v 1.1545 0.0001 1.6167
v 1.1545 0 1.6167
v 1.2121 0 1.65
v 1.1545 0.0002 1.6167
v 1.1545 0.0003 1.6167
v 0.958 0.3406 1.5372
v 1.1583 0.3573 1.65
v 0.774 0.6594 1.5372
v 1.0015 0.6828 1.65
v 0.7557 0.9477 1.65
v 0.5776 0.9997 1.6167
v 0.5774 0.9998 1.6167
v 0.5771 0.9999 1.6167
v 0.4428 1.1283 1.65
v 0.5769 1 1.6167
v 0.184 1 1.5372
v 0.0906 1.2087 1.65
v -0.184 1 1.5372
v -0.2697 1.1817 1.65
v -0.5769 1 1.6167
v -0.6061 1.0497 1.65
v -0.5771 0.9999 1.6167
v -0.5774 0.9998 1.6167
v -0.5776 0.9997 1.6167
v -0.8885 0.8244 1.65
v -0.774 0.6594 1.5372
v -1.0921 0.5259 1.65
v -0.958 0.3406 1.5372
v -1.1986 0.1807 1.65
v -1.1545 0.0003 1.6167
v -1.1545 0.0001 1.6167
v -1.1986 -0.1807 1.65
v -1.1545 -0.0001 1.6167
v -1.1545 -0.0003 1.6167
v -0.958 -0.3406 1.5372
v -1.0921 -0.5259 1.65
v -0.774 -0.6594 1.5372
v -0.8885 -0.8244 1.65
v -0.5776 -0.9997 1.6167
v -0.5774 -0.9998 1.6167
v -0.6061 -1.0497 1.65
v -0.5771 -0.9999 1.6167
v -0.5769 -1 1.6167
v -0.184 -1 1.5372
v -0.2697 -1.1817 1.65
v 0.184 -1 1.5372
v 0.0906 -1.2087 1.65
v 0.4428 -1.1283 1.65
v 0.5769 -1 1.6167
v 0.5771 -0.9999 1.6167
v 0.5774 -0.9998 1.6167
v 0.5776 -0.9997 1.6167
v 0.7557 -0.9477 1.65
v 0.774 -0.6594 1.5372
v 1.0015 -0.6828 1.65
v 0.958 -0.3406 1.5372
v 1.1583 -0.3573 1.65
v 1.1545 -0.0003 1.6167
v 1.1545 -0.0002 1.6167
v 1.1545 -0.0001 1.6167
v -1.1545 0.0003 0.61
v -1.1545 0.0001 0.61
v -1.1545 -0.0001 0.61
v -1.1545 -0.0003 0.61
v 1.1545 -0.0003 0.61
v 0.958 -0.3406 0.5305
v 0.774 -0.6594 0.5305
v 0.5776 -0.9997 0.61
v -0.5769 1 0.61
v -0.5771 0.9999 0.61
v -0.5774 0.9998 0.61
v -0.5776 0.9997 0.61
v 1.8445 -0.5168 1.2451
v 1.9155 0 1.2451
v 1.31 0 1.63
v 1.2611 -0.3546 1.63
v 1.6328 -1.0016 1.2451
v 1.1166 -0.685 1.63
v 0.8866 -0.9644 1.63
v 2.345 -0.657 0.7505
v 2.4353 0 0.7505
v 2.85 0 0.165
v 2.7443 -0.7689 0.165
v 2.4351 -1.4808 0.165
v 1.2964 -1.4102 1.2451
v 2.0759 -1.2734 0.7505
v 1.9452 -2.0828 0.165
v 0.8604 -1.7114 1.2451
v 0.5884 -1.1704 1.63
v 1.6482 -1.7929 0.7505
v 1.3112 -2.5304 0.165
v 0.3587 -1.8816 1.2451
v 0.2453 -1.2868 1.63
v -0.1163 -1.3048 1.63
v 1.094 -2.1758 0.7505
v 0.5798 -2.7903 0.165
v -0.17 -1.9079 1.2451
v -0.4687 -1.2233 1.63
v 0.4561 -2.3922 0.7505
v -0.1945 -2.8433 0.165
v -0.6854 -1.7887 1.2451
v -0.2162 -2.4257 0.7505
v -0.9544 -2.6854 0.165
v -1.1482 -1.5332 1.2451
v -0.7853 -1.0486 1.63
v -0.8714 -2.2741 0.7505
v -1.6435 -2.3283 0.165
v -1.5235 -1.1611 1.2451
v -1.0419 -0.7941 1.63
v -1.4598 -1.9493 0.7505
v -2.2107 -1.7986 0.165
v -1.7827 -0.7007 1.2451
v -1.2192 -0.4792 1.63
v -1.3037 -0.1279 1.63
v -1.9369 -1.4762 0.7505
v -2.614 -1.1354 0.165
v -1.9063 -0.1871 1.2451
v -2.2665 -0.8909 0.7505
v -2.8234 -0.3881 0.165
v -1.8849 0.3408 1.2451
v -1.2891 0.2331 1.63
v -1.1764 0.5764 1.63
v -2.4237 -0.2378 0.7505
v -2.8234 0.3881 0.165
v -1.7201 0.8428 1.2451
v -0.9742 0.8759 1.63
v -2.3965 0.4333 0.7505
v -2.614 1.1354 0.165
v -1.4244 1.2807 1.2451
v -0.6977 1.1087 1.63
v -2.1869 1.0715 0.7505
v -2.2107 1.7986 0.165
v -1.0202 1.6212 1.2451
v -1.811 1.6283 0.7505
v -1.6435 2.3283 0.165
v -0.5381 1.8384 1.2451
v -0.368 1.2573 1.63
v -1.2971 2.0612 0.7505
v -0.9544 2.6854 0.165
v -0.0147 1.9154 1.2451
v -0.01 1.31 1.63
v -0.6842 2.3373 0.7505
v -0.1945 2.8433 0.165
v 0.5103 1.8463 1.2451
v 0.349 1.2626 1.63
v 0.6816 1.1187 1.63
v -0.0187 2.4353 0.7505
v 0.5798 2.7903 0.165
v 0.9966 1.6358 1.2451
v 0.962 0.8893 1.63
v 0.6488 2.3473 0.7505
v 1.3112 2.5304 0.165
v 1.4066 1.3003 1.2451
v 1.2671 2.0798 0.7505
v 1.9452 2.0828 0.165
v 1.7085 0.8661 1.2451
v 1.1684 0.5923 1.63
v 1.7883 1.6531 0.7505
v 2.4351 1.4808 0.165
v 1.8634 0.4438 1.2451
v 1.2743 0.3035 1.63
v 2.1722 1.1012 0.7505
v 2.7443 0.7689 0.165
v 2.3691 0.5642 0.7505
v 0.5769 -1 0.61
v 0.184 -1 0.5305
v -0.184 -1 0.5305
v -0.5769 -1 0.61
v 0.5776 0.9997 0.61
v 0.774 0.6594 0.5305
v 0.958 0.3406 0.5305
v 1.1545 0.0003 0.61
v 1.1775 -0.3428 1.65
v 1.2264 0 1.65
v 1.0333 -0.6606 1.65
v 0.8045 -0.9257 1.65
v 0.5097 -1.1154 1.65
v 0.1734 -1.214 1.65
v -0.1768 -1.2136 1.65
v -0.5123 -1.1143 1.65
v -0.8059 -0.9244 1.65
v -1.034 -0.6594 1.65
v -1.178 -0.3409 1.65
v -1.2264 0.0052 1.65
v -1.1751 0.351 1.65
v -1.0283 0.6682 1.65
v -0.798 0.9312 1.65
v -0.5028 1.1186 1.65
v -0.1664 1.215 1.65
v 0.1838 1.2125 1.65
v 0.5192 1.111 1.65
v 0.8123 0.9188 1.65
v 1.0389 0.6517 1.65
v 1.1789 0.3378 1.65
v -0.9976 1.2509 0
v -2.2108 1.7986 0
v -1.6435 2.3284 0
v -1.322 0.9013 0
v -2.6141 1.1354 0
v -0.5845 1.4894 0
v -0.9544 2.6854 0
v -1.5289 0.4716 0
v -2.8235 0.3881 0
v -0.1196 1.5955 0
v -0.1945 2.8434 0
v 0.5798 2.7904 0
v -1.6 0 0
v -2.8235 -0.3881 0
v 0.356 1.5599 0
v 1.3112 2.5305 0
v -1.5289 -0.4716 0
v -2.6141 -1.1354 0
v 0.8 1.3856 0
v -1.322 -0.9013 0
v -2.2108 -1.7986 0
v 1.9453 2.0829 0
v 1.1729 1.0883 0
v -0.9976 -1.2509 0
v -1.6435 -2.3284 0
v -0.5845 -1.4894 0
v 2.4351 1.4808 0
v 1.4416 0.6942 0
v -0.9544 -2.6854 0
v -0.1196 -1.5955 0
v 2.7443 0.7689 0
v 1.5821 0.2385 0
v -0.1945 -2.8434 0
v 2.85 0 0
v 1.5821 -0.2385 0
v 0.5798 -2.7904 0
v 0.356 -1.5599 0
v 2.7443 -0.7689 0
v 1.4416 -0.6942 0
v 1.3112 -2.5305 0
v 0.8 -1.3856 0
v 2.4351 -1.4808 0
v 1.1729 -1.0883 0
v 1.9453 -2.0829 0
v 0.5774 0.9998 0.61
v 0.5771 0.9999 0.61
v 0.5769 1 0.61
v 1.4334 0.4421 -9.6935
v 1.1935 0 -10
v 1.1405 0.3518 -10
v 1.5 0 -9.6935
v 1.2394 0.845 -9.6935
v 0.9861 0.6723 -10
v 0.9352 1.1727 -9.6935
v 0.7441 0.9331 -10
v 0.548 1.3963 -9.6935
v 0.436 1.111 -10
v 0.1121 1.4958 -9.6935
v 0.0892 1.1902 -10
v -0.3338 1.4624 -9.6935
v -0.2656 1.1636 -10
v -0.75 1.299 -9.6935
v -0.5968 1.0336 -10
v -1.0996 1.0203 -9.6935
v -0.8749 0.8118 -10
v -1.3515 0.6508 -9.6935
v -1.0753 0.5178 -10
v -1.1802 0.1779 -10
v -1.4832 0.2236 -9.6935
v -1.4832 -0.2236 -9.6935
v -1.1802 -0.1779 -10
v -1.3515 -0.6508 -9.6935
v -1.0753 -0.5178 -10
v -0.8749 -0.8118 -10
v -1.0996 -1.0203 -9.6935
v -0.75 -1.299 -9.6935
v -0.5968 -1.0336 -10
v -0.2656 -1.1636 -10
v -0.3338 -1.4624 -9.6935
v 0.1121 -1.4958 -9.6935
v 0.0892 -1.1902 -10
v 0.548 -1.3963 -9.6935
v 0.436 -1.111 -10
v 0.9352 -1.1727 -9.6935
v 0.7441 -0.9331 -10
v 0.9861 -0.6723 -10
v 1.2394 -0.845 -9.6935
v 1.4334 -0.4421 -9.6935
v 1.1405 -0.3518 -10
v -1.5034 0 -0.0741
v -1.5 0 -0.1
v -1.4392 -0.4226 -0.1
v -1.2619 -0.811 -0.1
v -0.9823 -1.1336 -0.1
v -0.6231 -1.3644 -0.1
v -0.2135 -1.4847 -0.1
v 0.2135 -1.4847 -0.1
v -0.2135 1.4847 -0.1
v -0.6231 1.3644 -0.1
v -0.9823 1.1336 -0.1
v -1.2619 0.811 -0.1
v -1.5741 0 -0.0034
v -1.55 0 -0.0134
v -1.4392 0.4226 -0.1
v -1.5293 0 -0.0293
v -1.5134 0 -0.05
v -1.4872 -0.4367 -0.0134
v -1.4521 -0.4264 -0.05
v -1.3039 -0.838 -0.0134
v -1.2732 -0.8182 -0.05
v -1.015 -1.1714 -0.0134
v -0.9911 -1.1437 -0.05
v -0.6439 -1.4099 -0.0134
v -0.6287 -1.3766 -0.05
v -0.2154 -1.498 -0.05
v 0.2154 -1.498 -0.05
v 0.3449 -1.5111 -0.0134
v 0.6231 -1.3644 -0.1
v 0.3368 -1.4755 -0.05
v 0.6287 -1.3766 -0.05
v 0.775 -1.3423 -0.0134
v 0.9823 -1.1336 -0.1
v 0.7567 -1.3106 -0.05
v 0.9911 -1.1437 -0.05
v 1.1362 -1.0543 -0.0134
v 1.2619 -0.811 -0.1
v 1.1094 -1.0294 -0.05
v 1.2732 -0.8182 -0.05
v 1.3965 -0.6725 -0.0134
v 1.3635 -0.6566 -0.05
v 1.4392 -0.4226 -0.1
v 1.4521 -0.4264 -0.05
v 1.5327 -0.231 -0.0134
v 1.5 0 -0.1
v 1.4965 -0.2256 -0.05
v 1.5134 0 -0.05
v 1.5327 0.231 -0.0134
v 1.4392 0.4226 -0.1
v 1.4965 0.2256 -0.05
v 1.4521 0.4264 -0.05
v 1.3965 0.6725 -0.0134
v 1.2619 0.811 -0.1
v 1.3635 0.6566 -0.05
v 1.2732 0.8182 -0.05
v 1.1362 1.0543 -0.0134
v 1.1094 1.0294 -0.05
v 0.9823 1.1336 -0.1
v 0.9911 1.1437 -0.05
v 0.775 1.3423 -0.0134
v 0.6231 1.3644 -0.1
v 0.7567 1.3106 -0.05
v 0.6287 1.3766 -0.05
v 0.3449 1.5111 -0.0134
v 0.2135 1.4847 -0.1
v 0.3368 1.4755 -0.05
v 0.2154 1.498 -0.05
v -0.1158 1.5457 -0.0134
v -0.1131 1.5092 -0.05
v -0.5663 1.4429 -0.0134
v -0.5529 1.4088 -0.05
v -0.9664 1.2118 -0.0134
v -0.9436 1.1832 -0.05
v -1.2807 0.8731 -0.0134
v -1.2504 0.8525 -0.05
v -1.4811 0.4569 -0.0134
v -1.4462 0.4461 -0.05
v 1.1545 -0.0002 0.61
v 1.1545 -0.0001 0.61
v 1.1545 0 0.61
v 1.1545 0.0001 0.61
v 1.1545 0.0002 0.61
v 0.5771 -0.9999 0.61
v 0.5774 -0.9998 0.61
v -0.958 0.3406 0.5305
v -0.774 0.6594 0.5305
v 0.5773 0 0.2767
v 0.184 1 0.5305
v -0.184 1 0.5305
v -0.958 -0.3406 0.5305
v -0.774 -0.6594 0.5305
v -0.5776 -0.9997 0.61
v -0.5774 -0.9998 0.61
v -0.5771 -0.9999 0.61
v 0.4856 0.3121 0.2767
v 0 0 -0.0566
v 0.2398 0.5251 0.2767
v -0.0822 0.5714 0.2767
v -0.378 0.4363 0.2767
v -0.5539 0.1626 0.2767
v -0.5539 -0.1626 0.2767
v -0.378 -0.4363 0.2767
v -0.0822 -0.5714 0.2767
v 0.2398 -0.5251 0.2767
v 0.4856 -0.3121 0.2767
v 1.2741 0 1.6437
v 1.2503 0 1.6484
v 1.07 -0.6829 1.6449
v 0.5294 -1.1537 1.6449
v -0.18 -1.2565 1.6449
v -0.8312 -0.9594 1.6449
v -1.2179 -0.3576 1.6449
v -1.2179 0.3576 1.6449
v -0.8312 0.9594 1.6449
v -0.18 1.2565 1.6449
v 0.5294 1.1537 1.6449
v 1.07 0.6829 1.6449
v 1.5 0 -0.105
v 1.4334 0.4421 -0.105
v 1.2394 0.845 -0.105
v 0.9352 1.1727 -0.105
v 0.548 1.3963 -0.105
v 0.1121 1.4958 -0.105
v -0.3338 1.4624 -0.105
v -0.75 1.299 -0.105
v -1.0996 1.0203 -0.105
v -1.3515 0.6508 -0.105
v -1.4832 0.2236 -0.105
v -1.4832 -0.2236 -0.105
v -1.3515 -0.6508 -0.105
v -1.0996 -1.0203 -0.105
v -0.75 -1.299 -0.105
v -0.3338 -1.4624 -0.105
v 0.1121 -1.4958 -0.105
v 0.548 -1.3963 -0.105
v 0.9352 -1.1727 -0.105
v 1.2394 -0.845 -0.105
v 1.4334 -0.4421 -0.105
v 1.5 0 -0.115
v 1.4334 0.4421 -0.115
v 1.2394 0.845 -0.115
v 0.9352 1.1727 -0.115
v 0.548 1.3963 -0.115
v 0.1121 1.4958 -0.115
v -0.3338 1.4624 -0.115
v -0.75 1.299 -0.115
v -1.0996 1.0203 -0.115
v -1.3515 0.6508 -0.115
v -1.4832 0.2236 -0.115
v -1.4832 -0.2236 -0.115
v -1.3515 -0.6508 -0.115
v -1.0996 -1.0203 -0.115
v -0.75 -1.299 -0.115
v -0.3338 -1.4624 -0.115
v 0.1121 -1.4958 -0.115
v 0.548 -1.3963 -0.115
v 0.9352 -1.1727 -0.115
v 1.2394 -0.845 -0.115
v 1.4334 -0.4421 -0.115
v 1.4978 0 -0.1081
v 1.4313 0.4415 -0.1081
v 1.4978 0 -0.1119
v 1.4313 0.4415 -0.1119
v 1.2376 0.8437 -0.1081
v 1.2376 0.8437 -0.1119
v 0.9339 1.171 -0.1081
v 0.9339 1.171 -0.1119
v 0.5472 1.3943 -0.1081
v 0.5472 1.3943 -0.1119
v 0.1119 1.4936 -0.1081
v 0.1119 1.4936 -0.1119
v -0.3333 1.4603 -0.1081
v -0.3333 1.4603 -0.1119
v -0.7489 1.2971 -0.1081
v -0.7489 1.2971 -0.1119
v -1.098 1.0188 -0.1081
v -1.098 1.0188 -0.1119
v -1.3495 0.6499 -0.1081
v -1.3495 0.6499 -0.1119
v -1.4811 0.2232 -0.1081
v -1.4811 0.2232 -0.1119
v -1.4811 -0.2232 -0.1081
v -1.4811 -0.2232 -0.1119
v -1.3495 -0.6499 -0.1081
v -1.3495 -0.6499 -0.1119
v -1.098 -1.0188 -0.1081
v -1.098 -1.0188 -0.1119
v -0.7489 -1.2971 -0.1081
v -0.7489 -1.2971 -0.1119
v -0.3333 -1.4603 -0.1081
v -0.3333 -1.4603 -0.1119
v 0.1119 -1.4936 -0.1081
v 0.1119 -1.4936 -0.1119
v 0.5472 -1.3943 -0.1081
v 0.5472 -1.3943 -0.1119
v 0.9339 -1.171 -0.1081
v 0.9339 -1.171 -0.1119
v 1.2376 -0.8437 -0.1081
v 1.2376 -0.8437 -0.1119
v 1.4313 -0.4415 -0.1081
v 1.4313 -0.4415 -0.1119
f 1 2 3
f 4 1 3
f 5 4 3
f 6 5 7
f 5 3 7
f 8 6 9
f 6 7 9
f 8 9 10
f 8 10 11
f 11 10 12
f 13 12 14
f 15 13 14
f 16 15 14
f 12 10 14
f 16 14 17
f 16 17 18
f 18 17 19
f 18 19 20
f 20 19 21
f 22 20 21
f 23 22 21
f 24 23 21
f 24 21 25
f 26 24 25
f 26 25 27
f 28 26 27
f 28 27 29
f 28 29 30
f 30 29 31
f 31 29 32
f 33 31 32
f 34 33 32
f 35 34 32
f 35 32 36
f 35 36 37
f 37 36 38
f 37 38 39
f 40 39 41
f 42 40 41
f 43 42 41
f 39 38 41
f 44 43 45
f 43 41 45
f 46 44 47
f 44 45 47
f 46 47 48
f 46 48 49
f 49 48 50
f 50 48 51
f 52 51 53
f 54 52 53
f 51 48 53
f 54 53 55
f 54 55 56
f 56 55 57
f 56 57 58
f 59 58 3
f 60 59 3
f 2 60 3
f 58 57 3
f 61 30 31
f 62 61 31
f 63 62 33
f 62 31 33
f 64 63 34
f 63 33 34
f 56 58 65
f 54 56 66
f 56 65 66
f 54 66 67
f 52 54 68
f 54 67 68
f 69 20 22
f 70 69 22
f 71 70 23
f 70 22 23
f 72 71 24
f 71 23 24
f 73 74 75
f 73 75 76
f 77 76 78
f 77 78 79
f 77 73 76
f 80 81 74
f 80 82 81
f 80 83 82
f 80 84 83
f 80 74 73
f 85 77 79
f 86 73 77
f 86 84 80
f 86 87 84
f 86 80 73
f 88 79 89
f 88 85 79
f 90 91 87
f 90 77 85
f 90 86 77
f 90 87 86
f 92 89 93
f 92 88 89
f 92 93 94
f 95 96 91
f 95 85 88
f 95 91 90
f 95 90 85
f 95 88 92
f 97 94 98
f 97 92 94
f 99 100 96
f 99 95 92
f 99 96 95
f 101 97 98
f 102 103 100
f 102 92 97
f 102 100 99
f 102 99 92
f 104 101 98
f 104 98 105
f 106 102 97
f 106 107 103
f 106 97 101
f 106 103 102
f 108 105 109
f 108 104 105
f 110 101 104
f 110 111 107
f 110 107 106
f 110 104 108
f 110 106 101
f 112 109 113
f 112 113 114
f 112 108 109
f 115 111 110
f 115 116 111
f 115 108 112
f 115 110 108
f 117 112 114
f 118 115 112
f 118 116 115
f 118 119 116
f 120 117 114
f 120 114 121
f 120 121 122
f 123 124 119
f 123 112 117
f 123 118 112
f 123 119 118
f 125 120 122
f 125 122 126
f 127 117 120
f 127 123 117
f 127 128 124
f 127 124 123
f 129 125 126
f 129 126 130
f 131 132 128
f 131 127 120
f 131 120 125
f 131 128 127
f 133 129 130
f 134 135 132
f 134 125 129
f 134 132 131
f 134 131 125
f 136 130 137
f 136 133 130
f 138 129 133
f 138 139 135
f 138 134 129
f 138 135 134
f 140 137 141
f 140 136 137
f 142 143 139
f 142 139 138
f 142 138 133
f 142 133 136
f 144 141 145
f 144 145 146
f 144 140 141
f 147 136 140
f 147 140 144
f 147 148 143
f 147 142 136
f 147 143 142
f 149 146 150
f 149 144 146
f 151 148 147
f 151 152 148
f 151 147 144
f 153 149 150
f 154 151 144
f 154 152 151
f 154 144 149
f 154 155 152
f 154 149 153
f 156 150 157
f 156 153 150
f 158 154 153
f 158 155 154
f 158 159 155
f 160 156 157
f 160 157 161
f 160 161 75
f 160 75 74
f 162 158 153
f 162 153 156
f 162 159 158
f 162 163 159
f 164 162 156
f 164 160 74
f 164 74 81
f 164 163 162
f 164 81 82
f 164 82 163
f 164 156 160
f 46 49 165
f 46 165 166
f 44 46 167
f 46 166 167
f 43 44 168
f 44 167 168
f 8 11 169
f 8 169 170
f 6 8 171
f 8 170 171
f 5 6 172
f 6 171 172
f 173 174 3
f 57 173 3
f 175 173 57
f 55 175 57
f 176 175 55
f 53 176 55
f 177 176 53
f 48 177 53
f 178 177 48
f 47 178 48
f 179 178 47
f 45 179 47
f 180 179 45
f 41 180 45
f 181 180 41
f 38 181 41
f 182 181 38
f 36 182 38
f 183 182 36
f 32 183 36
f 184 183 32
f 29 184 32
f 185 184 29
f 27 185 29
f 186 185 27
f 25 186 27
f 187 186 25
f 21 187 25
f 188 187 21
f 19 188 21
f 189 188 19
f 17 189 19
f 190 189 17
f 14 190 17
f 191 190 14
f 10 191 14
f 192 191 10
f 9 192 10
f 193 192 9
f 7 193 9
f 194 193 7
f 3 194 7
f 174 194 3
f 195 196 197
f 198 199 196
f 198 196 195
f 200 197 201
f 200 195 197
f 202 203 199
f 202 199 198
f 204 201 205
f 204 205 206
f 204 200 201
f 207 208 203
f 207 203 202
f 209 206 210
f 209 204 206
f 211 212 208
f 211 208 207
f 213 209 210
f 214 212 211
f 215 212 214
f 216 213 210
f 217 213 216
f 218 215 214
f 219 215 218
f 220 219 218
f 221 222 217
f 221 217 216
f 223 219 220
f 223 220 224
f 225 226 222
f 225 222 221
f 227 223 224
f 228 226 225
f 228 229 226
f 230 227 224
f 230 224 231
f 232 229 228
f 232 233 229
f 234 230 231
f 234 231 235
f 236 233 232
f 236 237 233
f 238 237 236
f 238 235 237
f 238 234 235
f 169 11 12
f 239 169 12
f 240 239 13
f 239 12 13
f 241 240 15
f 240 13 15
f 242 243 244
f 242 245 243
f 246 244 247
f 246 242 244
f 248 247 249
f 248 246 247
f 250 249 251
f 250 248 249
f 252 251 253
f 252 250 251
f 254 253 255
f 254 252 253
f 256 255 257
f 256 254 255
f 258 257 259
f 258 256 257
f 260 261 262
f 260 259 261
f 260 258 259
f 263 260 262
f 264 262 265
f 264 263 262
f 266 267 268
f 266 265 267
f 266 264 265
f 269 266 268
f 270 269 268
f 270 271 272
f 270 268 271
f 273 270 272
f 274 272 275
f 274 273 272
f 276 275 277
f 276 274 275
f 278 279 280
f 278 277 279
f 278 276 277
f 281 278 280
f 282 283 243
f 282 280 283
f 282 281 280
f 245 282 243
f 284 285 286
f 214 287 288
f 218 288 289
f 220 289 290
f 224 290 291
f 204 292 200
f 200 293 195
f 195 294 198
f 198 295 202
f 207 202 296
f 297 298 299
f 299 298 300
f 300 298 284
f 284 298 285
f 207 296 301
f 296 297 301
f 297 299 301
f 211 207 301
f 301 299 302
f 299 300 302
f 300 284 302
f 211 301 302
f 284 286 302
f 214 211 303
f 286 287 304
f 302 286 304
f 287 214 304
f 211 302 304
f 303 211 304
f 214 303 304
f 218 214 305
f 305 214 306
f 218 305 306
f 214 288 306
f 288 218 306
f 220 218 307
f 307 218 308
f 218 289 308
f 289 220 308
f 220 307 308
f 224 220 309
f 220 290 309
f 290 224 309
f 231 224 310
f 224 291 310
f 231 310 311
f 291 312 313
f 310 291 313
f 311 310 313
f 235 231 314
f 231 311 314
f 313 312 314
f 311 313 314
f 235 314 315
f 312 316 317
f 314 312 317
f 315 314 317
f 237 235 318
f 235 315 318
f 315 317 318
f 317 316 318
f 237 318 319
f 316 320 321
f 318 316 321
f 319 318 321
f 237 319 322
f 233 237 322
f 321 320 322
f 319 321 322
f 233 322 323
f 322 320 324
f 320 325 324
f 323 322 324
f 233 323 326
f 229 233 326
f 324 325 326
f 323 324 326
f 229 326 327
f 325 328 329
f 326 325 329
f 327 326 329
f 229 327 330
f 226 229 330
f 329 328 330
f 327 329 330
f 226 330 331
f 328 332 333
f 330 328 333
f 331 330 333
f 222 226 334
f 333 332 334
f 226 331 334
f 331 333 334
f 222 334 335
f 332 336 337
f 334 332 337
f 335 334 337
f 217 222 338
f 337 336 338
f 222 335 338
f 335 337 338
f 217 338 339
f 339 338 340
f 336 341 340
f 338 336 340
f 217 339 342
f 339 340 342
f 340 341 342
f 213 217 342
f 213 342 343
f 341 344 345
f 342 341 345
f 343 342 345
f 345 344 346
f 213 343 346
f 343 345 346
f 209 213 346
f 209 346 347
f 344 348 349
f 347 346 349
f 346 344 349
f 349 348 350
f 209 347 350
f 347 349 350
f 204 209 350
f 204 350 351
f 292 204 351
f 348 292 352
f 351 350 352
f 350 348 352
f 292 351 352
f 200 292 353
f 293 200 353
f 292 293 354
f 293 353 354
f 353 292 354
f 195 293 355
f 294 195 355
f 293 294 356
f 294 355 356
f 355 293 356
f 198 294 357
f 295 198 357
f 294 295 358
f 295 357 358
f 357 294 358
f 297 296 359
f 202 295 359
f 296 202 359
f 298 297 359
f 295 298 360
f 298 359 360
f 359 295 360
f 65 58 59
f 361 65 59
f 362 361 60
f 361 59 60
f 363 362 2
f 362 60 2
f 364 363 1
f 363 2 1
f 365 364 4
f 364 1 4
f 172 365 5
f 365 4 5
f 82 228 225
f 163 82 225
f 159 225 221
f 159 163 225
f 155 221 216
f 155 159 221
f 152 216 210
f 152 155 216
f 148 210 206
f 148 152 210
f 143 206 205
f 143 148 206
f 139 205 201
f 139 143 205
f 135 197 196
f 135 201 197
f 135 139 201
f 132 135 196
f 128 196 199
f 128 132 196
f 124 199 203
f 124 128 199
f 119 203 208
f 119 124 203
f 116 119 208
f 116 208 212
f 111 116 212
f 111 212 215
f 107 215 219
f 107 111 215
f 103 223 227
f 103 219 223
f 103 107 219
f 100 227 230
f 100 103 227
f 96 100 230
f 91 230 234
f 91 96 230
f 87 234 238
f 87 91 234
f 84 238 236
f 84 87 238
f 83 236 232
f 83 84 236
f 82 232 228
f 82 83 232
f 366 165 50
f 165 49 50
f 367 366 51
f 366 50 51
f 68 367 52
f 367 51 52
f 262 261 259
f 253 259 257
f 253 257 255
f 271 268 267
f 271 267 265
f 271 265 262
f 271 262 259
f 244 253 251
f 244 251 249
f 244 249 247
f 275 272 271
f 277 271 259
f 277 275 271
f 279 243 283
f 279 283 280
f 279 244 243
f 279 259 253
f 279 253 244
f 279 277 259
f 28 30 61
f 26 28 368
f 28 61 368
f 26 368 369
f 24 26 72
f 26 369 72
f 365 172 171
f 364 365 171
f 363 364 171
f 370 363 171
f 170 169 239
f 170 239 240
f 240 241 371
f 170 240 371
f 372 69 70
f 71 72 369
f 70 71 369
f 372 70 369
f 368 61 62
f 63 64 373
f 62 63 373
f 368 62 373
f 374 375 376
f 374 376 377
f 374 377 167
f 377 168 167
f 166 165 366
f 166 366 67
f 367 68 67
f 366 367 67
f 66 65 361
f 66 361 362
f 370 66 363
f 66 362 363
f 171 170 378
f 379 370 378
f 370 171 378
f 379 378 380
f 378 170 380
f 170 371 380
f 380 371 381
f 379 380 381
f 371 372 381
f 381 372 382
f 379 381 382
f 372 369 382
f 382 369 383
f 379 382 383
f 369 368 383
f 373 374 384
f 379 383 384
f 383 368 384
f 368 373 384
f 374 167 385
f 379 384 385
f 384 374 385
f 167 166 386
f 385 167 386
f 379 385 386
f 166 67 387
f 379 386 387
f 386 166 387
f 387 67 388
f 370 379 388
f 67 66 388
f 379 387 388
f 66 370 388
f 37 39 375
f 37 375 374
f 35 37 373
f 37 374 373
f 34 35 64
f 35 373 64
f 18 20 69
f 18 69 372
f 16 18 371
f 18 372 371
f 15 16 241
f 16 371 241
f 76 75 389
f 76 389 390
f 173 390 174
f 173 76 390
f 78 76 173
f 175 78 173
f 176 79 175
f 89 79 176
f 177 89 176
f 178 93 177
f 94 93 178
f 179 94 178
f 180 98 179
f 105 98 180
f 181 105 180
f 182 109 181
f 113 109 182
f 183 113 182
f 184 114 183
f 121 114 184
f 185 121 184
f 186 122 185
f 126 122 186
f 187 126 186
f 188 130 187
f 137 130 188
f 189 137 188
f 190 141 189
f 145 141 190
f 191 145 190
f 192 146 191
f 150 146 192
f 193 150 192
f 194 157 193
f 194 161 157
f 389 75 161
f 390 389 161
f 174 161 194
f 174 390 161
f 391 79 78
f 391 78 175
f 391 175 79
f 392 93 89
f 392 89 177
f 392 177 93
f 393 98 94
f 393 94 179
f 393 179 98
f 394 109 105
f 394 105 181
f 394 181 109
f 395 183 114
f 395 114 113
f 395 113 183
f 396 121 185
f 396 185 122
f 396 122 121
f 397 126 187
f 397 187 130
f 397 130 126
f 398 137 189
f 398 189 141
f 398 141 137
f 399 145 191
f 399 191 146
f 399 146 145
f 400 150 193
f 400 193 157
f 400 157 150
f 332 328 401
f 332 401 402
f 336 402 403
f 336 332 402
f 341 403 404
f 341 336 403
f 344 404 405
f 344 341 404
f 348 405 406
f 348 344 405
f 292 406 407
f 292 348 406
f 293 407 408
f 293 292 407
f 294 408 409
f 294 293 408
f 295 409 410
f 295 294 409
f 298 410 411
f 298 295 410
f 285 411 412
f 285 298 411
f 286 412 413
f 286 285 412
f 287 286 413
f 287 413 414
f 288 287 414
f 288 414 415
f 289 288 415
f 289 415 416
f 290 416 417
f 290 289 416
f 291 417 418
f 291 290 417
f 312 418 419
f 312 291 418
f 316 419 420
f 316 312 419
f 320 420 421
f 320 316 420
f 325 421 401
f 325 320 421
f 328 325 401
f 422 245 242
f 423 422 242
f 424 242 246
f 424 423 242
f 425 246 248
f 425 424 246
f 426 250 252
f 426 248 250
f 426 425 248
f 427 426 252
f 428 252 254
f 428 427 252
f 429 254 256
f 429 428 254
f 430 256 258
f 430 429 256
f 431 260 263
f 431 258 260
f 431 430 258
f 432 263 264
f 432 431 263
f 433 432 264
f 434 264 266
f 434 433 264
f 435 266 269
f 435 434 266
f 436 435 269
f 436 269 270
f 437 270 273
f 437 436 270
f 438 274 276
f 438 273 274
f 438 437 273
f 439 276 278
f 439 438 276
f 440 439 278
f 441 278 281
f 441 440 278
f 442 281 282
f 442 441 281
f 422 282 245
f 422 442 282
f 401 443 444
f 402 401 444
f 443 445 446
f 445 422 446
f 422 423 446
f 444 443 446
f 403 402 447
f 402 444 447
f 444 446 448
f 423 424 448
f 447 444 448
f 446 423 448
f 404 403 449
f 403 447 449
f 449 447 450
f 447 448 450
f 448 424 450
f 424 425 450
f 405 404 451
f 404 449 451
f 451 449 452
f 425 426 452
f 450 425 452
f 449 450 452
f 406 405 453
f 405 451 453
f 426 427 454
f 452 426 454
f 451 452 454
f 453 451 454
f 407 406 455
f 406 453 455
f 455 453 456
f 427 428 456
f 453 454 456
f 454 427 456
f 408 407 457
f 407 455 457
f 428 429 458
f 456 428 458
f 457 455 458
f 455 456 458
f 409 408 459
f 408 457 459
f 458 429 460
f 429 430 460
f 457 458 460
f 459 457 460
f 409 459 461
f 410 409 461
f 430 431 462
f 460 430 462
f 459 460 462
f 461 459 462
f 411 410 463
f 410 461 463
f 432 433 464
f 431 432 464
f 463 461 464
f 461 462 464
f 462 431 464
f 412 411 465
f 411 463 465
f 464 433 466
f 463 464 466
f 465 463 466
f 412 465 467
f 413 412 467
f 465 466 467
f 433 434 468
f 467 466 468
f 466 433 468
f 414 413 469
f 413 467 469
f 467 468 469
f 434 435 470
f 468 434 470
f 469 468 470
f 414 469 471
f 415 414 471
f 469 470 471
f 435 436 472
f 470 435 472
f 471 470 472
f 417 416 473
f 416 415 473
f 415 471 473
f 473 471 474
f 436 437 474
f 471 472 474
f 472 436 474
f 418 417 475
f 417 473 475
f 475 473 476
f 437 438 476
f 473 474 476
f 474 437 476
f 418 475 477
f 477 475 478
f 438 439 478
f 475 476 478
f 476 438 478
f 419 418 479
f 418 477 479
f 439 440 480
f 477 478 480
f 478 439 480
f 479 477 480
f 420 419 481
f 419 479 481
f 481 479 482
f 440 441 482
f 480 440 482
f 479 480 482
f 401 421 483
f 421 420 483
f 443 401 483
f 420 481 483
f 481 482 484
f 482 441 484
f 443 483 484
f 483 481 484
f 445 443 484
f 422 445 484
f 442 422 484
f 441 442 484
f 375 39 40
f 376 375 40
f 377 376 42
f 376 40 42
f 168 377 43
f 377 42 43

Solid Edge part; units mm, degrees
sketch "Sketch1" plane through (0, 0, 0) normal (0, -1, 0) x (1, 0, 0)
  line L0 (0, -10) -> (1.5, -10)
  line L1 (1.5, -10) -> (1.5, -0.115)
  arc A0 (1.5, -0.105) -> (1.5, -0.115) centre (1.5038, -0.11) ccw
  line L2 (1.5, -0.105) -> (1.5, 0)
  line L3 (1.5, 0) -> (2.85, 0)
  line L4 (2.85, 0) -> (2.85, 0.165)
  arc A1 (1.27, 1.65) -> (2.85, 0.165) centre (-0.3628, -1.6703) cw
  line L5 (0, 1.65) -> (1.27, 1.65)
  dimension "D1" = 9.885
  dimension "D2" = 1.5
  dimension "D3" = 1.27
  dimension "D4" = 2.85
  dimension "D5" = 0.165
  dimension "D6" = 1.65
  dimension "D7" = 3.7
  dimension "D8" = 10
  dimension "D9" = 0.01
  dimension "D10" = 0.0025
revolve "RevolvedProtrusion1" add sketch "Sketch1" angle 360 about axis through (0, 0, 5) along (0, 0, -1)
sketch "Sketch2" plane through (0, 0, 0) normal (0, -1, 0) x (1, 0, 0)
  line L0 (0, -0.0566) -> (1.1545, 0.61)
  line L1 (1.1545, 0.61) -> (1.1545, 1.65)
  line L2 (1.1545, 1.65) -> (0, 1.65)
  dimension "D1" = 1.1545
  dimension "D2" = 1.04
revolve "RevolvedCutout1" cut sketch "Sketch2" angle 360 about axis through (0, 0, 5.3) along (0, 0, -1)
sketch "Sketch3" plane through (0, 0, 0) normal (0, 0, -1) x (0, 1, 0)
  arc A0 (-1, 0.577) -> (-1, -0.577) centre (0, 0) ccw
  line L0 (-1, 0.577) -> (-1, -0.577)
  dimension "D1" = 1
extrude "Protrusion1" add sketch "Sketch3" against normal blind 1.65
pattern_circular "Pattern1" count 6 over 360 about axis through (0, 0, 0) along (0, 0, -1) of "Protrusion1"
fillet "Round_1" radius 0.185 1 edges at (-1.27, 0, 1.65)
sketch "Sketch4" plane through (0, 0, 0) normal (0, -1, 0) x (1, 0, 0)
  line L0 (0, 0.9501) -> (1.2122, 1.65)
  line L1 (1.2122, 1.65) -> (0, 1.65)
  dimension "D1" = 1.2122
revolve "RevolvedCutout2" cut sketch "Sketch4" angle 360 about axis through (0, 0, 5.3) along (0, 0, -1)
sketch "Sketch5" plane through (0, 0, 0) normal (0, -1, 0) x (1, 0, 0)
  line L0 (-1.5, 0) -> (-1.5, -0.1)
  line L1 (-1.6, 0) -> (-1.5, 0)
  arc A0 (-1.6, 0) -> (-1.5, -0.1) centre (-1.6, -0.1) cw
  dimension "D1" = 1.5
  dimension "D2" = 0.1
revolve "RevolvedProtrusion2" add sketch "Sketch5" angle 360 about axis through (0, 0, -0.5) along (0, 0, 1)
cosmetic_thread "Thread1" size "M3"
chamfer "Chamfer1" distance 0.3065 angle 45 1 edges at (-1.5, 0, -10)
properties material "Stahl"
